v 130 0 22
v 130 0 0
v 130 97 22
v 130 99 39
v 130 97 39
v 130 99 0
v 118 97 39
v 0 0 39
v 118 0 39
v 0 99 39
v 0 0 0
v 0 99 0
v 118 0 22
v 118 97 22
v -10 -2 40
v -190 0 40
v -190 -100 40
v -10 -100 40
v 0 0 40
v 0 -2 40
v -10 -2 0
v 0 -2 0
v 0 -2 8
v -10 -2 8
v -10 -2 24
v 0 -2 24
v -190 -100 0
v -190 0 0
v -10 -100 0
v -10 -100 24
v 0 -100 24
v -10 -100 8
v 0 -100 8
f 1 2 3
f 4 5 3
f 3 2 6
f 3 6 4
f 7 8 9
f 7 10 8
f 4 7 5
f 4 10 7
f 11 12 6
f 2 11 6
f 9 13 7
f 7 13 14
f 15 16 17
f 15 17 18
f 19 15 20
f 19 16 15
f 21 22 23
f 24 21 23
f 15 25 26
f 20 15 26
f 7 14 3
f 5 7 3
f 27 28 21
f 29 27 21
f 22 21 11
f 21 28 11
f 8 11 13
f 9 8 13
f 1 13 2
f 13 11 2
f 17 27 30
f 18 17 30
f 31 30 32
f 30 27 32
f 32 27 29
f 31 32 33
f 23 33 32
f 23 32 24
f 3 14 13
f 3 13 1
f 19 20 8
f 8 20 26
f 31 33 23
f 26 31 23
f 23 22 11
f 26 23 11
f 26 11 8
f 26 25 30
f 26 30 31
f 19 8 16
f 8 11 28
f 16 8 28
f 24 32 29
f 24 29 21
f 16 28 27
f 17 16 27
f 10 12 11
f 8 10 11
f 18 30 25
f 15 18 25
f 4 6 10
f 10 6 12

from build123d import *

# Parameters (mm, degrees)
F0_W     = 12
F0_H     = 97
F0_H_2   = 2
F1_DEPTH = 22
F0_W_2   = 118
F2_DEPTH = 39
F0_W_3   = 180
F0_H_3   = 98
F0_W_4   = 10
F3_DEPTH = 40
F4_DEPTH = 24
F5_W     = 98
F5_H     = 8
F6_DEPTH = 10


with BuildPart() as f1:
    # F0 (on Top) → F1 (new body)
    with BuildSketch(Plane.XY):
        with Locations((124, 48.5)):
            Rectangle(F0_W, F0_H)
        with Locations((124, 98)):
            Rectangle(F0_W, F0_H_2)
    extrude(amount=F1_DEPTH)

    # F0 (on Top) → F2 (join)
    with BuildSketch(Plane.XY):
        with Locations((59, 48.5)):
            Rectangle(F0_W_2, F0_H)
        with Locations((59, 98)):
            Rectangle(F0_W_2, F0_H_2)
        with Locations((124, 98)):
            Rectangle(F0_W, F0_H_2)
    extrude(amount=F2_DEPTH)



with BuildPart() as f3:
    # F0 (on Top) → F3 (new body)
    with BuildSketch(Plane.XY):
        with Locations((-100, -1)):
            Rectangle(F0_W_3, F0_H_2)
        with Locations((-100, -51)):
            Rectangle(F0_W_3, F0_H_3)
        with Locations((-5, -1)):
            Rectangle(F0_W_4, F0_H_2)
    extrude(amount=F3_DEPTH)


with BuildPart() as f1_1:
    add(f1.part)

    add(f3.part)  # F4 merges F3
    # F0 (on Top) → F4 (join)
    with BuildSketch(Plane.XY):
        with Locations((-5, -1)):
            Rectangle(F0_W_4, F0_H_2)
        with Locations((-5, -51)):
            Rectangle(F0_W_4, F0_H_3)
    extrude(amount=F4_DEPTH)

    # F5 (on face) → F6 (cut)
    with BuildSketch(Plane.YZ):
        with Locations((-51, 4)):
            Rectangle(F5_W, F5_H)
    extrude(amount=-F6_DEPTH, mode=Mode.SUBTRACT)


solid = f1_1.part
